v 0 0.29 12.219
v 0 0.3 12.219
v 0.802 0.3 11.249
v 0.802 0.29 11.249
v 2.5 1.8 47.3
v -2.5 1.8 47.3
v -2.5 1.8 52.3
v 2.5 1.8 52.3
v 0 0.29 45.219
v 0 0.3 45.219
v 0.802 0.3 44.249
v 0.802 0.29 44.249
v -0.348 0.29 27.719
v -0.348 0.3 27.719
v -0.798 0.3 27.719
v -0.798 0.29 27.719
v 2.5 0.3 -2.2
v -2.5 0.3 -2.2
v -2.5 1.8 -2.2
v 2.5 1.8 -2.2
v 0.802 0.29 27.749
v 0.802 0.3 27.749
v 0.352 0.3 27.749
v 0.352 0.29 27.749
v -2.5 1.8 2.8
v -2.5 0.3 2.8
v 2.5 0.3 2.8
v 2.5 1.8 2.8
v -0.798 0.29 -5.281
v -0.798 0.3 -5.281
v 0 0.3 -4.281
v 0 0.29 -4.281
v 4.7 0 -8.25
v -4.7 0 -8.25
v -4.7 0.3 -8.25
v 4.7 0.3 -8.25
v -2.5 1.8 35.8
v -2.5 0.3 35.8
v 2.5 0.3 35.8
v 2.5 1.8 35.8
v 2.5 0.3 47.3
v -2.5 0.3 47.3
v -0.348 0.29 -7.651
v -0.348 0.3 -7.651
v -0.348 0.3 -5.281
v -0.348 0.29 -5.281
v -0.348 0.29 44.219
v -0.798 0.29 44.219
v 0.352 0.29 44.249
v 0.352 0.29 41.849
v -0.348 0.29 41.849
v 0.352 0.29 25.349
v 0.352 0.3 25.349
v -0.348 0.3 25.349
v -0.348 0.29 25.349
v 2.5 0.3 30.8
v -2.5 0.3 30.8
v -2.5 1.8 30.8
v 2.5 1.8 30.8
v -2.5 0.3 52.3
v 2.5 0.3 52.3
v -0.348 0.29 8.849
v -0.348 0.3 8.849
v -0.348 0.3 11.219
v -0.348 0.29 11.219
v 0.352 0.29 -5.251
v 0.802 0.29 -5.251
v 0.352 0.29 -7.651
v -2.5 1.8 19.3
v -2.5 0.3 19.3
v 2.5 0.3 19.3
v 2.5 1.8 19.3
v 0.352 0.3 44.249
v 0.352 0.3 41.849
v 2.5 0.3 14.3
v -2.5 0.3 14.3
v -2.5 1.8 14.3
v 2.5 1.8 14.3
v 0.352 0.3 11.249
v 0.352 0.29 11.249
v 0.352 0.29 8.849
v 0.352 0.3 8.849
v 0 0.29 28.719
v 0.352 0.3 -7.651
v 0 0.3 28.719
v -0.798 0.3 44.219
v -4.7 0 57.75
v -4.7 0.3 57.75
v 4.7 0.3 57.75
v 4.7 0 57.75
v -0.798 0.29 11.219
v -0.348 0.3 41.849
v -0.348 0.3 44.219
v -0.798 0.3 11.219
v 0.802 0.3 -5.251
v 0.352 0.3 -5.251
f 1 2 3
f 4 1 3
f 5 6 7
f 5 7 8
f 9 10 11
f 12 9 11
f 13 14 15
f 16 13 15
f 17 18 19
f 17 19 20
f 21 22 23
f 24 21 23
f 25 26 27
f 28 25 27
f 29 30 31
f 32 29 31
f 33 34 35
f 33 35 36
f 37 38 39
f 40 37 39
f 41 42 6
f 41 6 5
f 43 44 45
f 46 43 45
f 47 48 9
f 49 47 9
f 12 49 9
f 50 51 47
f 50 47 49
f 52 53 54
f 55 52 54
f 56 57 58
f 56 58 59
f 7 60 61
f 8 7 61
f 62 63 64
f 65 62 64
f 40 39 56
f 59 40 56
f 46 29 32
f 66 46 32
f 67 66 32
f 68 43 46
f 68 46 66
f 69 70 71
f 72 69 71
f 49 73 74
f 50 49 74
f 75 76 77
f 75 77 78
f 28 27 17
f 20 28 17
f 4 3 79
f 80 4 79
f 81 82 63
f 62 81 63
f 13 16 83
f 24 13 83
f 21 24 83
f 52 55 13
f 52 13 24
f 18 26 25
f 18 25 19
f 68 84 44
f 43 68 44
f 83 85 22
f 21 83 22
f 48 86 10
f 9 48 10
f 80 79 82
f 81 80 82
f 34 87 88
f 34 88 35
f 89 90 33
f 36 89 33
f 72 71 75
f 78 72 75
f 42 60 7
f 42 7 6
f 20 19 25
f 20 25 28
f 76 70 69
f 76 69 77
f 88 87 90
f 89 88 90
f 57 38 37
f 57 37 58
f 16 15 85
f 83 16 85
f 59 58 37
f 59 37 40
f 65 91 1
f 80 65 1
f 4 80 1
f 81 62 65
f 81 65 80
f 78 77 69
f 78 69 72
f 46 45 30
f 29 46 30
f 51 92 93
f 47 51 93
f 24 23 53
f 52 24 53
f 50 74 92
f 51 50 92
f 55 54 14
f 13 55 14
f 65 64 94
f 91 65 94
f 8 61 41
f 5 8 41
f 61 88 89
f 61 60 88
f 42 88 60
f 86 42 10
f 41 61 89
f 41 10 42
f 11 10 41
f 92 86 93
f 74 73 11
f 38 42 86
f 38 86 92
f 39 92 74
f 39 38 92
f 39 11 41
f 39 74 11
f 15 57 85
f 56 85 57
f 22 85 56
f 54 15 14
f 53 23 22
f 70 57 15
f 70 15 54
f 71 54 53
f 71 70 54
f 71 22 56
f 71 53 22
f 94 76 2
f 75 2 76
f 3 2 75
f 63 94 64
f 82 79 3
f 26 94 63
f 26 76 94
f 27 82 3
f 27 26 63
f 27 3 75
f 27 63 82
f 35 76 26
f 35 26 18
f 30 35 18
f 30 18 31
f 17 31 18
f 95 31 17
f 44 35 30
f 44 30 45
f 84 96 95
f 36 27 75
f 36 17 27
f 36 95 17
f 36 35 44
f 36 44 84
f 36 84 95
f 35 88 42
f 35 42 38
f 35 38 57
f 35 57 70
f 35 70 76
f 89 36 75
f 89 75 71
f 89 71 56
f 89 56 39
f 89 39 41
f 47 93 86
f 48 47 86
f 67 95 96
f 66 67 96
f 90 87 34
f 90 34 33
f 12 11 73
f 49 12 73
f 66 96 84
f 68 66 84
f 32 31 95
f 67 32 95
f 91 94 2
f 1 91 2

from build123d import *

# Parameters (mm, degrees)
SKETCH1_W           = 9.4
SKETCH1_H           = 16.5
BOSS_EXTRUDE1_DEPTH = 0.3
SKETCH2_W           = 5
SKETCH2_H           = 5
BOSS_EXTRUDE2_DEPTH = 1.5
CUT_EXTRUDE1_DEPTH  = 0.01
LPATTERN1_COUNT     = 4
LPATTERN1_PITCH     = 16.5


with BuildPart() as part:
    # Sketch1 → Boss-Extrude1 (new body)
    with BuildSketch(Plane(origin=(0, 0, 0), x_dir=(1, 0, 0), z_dir=(0, 1, 0))):
        Rectangle(SKETCH1_W, SKETCH1_H)
    boss_extrude1 = extrude(amount=BOSS_EXTRUDE1_DEPTH)

    # Sketch2 → Boss-Extrude2 (add)
    with BuildSketch(Plane(origin=(0, 0.3, 0), x_dir=(1, 0, 0), z_dir=(0, 1, 0))):
        with Locations((0, -0.3)):
            Rectangle(SKETCH2_W, SKETCH2_H)
    boss_extrude2 = extrude(amount=BOSS_EXTRUDE2_DEPTH)

    # Sketch3 → Cut-Extrude1 (cut)
    with BuildSketch(Plane(origin=(0, 0.3, 0), x_dir=(1, 0, 0), z_dir=(0, 1, 0))):
        Polygon((-0.34778048, 5.281417879), (-0.79778048, 5.281417879), (0, 4.281417879), (0.80221952, 5.251170562), (0.35221952, 5.251170562), (0.35221952, 7.651170562), (-0.34778048, 7.651170562), align=None)
    cut_extrude1 = extrude(amount=-CUT_EXTRUDE1_DEPTH, mode=Mode.SUBTRACT)

    # LPattern1: Boss-Extrude1, Boss-Extrude2, Cut-Extrude1 ×4
    with Locations(*[(0, 0, i * LPATTERN1_PITCH) for i in range(1, LPATTERN1_COUNT)]):
        add(boss_extrude1)
        add(boss_extrude2)
        add(cut_extrude1, mode=Mode.SUBTRACT)


solid = part.part
